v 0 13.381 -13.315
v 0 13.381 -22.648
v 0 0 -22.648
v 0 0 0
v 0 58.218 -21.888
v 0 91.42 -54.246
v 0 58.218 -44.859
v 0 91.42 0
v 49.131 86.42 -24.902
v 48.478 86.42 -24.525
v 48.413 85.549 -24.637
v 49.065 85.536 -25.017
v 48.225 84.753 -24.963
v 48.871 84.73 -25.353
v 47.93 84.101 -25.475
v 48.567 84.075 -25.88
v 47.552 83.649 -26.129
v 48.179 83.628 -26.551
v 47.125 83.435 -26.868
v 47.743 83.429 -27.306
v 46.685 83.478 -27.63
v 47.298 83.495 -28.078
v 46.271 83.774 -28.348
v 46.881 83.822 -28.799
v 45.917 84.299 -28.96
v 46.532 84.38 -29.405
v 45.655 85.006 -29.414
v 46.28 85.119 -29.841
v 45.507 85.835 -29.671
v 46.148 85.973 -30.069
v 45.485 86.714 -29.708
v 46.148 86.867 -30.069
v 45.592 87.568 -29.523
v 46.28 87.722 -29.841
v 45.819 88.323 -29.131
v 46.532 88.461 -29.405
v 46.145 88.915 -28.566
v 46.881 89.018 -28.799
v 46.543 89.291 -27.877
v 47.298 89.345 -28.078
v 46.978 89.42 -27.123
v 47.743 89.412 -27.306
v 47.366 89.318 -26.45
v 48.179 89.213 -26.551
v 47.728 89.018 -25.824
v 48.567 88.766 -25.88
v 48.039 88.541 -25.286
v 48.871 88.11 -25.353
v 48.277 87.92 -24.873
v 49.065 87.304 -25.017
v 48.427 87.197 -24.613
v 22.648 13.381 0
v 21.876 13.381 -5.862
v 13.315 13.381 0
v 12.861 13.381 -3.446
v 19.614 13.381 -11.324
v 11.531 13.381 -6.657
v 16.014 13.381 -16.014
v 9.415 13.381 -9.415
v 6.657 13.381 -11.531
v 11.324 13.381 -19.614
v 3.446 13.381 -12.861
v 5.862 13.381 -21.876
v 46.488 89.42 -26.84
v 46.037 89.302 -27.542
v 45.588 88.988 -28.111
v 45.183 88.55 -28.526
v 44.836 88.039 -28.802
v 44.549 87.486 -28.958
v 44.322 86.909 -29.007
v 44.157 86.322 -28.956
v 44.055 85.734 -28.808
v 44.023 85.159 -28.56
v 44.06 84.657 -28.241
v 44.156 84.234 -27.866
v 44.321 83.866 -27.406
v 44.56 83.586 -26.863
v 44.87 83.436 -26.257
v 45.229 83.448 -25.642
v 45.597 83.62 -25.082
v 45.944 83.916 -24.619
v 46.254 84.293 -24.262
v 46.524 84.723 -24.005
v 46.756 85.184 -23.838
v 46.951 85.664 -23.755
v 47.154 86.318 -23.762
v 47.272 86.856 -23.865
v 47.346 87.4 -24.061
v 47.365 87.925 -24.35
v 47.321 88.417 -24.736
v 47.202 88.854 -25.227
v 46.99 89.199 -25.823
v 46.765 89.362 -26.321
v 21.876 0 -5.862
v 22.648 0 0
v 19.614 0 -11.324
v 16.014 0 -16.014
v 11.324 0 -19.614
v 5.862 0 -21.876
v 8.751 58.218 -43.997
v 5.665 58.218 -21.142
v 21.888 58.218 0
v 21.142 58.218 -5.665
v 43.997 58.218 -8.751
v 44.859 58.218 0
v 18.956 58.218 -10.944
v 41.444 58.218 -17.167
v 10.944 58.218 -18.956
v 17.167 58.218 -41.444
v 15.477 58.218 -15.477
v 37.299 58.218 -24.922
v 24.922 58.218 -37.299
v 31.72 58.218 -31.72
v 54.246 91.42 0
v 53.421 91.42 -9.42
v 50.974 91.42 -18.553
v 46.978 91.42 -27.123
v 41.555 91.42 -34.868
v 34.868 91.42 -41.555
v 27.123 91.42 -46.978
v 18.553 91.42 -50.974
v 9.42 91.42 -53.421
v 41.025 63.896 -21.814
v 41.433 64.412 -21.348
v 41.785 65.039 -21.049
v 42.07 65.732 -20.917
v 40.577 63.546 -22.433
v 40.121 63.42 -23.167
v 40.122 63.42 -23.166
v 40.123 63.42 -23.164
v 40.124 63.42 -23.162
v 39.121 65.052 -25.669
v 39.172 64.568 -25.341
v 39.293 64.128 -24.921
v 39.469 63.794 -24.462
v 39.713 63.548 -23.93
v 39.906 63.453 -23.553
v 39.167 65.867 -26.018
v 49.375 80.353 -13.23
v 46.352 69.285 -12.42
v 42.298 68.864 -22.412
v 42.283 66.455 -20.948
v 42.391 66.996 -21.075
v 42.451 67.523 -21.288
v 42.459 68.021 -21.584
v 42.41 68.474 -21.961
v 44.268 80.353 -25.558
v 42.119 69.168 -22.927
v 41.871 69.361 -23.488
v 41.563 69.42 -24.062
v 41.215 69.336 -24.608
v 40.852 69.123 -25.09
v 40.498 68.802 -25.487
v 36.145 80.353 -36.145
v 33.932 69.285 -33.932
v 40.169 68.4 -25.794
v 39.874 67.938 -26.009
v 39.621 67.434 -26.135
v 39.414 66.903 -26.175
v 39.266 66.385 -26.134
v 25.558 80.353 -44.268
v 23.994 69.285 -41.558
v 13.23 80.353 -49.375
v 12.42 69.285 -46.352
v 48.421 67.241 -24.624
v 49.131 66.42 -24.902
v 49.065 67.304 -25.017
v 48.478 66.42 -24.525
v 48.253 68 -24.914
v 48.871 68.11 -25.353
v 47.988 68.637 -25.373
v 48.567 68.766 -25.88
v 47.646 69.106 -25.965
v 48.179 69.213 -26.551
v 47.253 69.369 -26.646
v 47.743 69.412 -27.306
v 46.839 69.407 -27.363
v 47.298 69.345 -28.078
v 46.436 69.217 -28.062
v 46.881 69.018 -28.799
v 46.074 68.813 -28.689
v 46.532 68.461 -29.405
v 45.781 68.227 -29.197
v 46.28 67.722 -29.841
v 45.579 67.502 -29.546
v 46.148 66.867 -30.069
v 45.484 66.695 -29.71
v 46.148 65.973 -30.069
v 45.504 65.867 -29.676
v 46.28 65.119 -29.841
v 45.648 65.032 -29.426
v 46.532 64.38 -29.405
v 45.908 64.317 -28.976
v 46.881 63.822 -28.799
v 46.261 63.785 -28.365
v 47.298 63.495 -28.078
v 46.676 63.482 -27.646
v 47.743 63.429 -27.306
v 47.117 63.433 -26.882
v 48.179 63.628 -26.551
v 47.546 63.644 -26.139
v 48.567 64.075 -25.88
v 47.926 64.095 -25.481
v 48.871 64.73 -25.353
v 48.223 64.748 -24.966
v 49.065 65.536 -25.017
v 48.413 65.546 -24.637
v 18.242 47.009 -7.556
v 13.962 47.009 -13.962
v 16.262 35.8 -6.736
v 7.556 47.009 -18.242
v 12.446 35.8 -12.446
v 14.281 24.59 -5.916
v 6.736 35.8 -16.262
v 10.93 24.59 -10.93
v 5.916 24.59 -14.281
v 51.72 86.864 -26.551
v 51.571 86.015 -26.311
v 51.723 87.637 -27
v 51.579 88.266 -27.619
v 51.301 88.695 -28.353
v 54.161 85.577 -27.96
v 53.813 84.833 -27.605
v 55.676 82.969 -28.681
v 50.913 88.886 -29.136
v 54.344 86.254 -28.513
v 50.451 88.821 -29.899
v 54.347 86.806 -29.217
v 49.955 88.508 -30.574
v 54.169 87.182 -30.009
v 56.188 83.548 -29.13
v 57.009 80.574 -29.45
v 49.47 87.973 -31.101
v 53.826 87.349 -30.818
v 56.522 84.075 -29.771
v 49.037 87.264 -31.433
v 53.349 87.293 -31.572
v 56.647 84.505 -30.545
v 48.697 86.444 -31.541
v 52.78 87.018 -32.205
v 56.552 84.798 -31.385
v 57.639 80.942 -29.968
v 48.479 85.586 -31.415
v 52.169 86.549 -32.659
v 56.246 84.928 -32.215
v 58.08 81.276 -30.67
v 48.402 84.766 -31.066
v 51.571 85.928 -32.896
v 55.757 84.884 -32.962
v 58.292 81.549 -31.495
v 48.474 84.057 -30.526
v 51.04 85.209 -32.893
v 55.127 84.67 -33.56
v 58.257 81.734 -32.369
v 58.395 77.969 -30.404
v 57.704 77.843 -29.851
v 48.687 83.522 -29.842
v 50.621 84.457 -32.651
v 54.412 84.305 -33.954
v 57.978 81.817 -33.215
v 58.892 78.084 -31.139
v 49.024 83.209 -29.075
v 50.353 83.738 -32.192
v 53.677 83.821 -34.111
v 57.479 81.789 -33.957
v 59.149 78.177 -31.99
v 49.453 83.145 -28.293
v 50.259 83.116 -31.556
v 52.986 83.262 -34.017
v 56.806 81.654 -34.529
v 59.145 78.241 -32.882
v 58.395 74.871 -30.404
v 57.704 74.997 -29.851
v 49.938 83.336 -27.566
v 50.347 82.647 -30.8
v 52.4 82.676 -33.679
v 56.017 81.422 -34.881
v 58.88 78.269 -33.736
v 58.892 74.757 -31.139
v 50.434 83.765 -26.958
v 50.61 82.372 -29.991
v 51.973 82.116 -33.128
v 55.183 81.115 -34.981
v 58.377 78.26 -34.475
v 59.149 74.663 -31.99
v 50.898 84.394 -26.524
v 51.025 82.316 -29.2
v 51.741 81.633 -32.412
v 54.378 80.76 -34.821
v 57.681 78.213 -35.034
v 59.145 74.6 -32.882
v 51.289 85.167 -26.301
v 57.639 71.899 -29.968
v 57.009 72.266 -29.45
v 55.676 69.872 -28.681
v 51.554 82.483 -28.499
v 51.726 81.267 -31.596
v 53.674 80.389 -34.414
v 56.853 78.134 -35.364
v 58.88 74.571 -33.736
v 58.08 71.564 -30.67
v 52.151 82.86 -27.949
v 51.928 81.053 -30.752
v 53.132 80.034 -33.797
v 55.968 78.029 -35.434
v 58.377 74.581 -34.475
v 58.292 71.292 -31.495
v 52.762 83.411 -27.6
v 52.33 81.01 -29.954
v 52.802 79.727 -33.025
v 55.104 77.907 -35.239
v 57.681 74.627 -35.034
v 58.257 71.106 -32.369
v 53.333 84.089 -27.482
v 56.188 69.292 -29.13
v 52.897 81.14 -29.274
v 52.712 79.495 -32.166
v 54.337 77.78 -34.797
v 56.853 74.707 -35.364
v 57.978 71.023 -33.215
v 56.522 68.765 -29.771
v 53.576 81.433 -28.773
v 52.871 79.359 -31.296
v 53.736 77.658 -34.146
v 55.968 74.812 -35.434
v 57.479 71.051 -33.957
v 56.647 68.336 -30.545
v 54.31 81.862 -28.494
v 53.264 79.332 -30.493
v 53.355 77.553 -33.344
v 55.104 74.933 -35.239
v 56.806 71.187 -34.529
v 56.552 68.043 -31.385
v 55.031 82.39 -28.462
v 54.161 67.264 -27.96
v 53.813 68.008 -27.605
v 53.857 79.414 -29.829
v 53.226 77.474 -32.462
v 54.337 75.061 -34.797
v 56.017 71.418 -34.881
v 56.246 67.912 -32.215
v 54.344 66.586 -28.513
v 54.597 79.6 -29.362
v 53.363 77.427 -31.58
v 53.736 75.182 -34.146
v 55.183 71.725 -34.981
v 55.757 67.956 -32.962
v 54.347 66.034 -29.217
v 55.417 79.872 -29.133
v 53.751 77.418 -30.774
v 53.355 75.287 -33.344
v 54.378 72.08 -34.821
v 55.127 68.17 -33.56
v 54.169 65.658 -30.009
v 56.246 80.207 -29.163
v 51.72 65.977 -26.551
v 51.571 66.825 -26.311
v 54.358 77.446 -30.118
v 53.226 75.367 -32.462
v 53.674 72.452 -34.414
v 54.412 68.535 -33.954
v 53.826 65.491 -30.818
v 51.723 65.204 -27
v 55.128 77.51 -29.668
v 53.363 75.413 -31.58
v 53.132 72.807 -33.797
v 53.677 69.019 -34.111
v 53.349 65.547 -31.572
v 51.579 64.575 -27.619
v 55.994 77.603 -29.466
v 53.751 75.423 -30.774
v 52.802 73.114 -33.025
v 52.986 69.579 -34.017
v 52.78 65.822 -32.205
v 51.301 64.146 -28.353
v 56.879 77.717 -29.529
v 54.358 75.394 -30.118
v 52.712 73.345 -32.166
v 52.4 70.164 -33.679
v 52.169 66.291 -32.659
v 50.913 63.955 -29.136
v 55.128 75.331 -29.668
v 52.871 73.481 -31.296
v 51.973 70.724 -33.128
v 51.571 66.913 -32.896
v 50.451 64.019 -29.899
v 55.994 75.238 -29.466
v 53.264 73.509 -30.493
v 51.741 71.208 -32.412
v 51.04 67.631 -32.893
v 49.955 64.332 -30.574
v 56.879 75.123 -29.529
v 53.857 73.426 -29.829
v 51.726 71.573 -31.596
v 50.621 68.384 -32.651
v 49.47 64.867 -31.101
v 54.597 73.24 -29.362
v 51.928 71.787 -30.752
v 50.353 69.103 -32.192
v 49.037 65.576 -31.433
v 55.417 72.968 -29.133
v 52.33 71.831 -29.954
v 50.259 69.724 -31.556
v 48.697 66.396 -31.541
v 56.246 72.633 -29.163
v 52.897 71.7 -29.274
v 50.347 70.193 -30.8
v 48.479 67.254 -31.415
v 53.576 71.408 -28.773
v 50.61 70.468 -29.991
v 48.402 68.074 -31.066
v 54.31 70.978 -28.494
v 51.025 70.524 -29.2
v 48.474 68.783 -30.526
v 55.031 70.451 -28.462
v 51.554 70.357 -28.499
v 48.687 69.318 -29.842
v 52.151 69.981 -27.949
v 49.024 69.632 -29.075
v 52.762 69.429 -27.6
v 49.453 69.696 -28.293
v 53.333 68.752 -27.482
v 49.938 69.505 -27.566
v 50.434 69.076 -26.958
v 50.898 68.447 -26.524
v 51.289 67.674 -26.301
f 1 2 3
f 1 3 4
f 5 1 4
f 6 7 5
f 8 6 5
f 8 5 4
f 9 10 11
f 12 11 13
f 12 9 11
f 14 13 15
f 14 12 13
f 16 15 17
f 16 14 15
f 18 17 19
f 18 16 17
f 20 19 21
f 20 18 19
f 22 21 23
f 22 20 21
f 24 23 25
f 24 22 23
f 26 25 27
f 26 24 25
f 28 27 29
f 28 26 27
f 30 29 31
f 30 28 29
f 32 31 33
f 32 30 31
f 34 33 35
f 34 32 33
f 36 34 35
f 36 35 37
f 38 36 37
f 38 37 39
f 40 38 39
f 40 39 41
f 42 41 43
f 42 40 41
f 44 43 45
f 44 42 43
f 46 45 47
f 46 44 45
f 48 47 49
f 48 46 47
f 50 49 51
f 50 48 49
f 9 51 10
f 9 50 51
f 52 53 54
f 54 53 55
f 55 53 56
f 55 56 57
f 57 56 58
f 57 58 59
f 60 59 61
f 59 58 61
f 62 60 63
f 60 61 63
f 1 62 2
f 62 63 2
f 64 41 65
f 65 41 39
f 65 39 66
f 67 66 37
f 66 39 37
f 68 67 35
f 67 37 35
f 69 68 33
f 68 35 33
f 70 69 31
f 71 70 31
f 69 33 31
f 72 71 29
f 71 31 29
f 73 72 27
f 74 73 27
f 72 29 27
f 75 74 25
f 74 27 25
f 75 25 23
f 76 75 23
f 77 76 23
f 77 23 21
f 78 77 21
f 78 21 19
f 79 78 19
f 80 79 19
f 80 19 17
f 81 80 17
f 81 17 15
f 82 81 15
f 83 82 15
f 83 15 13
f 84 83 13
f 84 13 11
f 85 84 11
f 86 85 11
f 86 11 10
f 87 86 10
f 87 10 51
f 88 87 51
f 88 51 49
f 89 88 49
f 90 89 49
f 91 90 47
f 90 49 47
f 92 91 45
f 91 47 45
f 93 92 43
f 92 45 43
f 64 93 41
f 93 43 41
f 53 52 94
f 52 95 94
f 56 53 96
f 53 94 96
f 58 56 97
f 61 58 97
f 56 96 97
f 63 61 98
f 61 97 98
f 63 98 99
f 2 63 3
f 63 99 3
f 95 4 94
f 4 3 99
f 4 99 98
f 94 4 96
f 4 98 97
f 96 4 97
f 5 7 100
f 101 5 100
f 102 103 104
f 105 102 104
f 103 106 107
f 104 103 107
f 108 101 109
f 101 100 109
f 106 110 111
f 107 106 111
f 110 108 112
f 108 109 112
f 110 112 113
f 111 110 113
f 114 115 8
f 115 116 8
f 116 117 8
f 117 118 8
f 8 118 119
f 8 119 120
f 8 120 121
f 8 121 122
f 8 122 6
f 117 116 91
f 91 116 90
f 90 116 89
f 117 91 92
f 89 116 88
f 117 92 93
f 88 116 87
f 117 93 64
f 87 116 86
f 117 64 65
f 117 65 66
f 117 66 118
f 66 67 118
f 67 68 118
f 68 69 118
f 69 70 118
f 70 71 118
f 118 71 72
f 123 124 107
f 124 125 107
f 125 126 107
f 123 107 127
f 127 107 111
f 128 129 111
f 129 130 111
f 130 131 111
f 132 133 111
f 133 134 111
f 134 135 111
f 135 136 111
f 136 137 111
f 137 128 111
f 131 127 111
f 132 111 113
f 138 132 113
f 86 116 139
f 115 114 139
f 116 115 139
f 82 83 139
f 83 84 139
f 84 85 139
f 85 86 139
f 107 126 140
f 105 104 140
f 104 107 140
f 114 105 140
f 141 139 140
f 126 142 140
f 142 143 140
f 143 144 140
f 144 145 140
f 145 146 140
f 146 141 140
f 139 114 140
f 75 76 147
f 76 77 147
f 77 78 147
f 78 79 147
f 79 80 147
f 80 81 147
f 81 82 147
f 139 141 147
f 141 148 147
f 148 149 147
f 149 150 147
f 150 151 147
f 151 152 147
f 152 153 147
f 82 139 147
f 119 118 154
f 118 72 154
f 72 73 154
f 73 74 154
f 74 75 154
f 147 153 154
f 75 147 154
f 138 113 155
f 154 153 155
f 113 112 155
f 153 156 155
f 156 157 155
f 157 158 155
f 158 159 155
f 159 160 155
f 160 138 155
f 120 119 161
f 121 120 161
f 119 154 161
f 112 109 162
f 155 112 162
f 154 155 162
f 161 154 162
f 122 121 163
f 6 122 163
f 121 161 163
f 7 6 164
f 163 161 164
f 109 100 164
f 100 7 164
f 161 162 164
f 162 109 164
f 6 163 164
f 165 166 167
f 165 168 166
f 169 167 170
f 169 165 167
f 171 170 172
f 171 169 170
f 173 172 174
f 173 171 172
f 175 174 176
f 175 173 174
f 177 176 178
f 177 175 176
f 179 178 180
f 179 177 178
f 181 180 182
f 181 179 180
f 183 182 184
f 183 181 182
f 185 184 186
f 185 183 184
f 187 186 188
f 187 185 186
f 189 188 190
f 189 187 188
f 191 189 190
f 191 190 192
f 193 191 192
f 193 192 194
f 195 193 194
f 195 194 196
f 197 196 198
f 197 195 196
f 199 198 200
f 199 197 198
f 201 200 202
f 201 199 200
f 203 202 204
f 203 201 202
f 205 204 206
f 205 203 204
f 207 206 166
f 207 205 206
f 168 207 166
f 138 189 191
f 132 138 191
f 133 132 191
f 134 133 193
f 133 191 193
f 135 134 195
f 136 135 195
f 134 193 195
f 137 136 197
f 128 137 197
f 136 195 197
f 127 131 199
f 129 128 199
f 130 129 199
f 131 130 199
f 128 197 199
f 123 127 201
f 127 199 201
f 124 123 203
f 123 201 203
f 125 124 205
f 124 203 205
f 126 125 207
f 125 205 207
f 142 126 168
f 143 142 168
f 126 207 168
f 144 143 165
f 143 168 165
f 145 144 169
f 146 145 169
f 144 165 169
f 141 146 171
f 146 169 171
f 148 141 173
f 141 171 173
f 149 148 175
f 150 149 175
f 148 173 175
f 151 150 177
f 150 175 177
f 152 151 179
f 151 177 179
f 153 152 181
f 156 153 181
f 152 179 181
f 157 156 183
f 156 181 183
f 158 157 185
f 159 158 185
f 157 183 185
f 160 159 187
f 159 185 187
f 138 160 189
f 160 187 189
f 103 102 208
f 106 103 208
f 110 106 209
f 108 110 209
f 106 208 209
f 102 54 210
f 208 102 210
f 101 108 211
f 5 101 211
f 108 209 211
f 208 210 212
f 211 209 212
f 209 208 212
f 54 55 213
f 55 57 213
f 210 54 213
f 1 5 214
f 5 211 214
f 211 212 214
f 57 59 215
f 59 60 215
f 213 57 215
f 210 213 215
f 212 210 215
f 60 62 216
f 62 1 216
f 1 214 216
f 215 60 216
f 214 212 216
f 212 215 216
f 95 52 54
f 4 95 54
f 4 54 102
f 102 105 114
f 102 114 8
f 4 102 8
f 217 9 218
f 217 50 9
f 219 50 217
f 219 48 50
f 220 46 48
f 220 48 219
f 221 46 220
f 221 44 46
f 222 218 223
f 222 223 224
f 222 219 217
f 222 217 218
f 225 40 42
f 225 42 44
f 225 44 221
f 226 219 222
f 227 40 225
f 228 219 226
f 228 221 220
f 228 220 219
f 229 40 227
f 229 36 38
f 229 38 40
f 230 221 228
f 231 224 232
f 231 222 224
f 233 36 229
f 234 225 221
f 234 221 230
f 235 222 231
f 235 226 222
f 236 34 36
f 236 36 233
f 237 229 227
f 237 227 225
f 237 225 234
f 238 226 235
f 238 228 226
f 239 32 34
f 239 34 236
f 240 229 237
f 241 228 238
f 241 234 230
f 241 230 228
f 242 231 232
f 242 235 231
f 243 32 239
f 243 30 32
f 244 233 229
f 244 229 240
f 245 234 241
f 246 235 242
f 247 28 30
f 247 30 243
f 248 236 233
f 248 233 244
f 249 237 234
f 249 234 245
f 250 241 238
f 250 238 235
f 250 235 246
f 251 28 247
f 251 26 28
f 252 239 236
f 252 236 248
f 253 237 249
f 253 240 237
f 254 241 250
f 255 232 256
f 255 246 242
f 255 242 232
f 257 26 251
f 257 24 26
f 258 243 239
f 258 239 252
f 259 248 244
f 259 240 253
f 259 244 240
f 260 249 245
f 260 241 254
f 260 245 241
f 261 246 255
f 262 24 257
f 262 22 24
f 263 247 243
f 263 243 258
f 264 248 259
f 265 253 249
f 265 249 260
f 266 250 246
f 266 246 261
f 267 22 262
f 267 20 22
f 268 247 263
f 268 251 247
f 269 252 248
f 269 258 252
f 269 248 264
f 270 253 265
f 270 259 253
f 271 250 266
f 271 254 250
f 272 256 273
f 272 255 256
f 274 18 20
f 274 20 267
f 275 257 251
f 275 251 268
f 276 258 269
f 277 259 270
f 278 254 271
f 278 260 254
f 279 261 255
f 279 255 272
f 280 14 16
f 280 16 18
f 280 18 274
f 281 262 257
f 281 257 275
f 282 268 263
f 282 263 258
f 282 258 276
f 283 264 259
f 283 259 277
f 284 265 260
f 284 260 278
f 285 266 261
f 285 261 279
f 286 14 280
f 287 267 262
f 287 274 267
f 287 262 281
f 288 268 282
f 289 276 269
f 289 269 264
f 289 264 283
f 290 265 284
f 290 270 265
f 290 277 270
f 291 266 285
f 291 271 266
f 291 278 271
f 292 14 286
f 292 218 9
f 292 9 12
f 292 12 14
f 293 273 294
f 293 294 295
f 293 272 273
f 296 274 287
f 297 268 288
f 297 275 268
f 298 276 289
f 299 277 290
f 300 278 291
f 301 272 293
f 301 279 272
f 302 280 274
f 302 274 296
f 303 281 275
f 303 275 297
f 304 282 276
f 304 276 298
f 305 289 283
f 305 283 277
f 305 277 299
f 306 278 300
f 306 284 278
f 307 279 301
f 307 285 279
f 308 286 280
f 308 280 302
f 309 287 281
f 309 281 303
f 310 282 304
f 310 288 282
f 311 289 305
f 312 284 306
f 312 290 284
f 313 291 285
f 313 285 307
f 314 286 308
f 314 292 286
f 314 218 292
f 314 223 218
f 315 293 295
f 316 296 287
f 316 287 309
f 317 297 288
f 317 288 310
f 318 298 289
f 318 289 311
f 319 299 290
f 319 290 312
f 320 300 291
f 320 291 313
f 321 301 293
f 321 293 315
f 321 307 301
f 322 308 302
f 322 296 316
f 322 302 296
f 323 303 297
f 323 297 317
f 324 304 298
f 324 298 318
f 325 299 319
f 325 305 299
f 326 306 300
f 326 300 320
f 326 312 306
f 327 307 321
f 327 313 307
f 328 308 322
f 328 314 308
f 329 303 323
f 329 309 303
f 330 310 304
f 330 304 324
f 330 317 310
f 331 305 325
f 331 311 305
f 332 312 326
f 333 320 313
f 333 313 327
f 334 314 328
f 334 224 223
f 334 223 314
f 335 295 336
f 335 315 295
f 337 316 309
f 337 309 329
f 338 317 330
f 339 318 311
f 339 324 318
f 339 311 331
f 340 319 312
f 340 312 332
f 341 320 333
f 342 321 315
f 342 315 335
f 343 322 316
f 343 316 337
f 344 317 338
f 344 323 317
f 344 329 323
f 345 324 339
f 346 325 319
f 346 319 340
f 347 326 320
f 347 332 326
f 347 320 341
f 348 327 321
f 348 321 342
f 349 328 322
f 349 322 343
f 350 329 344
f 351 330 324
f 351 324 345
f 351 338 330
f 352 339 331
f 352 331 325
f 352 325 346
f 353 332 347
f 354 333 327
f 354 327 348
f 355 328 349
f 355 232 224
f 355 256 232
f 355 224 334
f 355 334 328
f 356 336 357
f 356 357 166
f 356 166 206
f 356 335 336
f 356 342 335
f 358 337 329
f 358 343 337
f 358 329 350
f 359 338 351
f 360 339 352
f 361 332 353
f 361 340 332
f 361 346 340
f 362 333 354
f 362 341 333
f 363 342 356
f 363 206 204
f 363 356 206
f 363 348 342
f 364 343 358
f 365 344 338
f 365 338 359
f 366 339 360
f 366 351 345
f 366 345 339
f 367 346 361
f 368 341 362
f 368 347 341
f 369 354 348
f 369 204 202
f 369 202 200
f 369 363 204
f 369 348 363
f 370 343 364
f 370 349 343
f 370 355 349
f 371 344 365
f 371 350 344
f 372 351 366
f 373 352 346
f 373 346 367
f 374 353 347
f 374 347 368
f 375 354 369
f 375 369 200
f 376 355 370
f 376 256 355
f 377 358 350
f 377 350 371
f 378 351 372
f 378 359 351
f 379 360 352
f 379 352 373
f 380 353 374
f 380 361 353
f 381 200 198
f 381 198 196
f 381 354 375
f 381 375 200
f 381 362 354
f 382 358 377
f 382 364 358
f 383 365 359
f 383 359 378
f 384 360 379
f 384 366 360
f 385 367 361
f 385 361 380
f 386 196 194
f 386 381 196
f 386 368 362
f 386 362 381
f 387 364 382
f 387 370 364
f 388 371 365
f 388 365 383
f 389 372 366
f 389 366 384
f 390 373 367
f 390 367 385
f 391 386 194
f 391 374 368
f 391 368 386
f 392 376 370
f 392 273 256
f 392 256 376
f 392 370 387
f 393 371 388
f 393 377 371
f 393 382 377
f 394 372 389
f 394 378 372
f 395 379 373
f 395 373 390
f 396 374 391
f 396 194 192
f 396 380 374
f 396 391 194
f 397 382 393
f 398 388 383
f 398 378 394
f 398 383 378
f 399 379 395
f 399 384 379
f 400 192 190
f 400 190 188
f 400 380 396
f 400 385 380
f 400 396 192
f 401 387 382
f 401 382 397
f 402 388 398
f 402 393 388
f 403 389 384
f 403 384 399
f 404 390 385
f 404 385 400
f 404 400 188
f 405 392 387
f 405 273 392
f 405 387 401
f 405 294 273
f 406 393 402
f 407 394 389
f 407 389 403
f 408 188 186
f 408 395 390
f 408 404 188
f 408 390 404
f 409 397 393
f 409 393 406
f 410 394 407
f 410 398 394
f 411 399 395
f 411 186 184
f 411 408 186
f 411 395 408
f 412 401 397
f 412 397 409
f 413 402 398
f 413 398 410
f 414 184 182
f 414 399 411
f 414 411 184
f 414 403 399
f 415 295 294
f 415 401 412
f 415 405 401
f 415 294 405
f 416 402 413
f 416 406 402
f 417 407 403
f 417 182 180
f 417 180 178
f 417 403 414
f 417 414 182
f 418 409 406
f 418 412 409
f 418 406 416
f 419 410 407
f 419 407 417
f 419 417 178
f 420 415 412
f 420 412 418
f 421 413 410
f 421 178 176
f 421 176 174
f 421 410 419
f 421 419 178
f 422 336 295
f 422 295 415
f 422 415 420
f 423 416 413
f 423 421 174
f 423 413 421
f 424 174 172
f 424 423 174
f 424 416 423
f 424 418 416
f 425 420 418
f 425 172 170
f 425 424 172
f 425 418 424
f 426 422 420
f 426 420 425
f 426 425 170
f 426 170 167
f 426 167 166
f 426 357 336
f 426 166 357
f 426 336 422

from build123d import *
from build123d.topology import SkipClean

# Parameters (mm, degrees)
ROTATION1_ANGLE                 = 90
SKIZZE5_R                       = 3
SKIZZE7_R                       = 3
AUFSATZ_LINEAR_AUSTRAGEN1_DEPTH = 7.91623


with BuildPart() as part:
    # Skizze1 → Rotation1 (revolve)
    with BuildSketch(Plane.XY):
        Polygon((0, 0), (0, 91.42015625), (54.245597194, 91.42015625), (44.858528754, 58.217747507), (21.888186449, 58.217747507), (13.314555528, 13.381302083), (22.647732611, 13.381302083), (22.647732611, 0), align=None)
    revolve(axis=Axis((0, 0, 0), (0, 1, 0)), revolution_arc=ROTATION1_ANGLE)



with BuildPart() as body_2:
    # Austragung2: sweep along a path in Skizze6
    with BuildLine(Plane(origin=(0, 0, 0), x_dir=(0.866025404, 0, -0.5), z_dir=(0.5, 0, 0.866025404))) as austragung2_path:
        Line((54.245597194, 86.42015625), (55, 86.42015625))
        ThreePointArc((55, 86.42015625), (65, 76.42015625), (55, 66.42015625))
        Line((55, 66.42015625), (54.245597194, 66.42015625))
    # Skizze5 → Austragung2 (sweep)
    with BuildSketch(Plane(origin=(46.978065214, 0, -27.122798597), x_dir=(0.5, 0, 0.866025404), z_dir=(-0.866025404, 0, 0.5))):
        with Locations((0, 86.42015625)):
            Circle(SKIZZE5_R)
    sweep(path=austragung2_path.line)


with BuildPart() as part_1:
    with SkipClean():  # keep this step's faces unmerged: merging them makes the solid invalid here
        add(part.part)

        add(body_2.part)  # Aufsatz-Linear austragen1 merges body 2
        # Skizze7 → Aufsatz-Linear austragen1 (add)
        with BuildSketch(Plane(origin=(46.978065214, 0, -27.122798597), x_dir=(0.5, 0, 0.866025404), z_dir=(-0.866025404, 0, 0.5))):
            with Locations(Location((0, 66.42015625, 0), (0, 0, 190.622906641))):  # turned: the seam where the file's is
                Circle(SKIZZE7_R)
            with Locations(Location((0, 86.42015625, 0), (0, 0, 90))):  # turned: the seam where the file's is
                Circle(SKIZZE7_R)
        extrude(amount=AUFSATZ_LINEAR_AUSTRAGEN1_DEPTH)


solid = part_1.part
